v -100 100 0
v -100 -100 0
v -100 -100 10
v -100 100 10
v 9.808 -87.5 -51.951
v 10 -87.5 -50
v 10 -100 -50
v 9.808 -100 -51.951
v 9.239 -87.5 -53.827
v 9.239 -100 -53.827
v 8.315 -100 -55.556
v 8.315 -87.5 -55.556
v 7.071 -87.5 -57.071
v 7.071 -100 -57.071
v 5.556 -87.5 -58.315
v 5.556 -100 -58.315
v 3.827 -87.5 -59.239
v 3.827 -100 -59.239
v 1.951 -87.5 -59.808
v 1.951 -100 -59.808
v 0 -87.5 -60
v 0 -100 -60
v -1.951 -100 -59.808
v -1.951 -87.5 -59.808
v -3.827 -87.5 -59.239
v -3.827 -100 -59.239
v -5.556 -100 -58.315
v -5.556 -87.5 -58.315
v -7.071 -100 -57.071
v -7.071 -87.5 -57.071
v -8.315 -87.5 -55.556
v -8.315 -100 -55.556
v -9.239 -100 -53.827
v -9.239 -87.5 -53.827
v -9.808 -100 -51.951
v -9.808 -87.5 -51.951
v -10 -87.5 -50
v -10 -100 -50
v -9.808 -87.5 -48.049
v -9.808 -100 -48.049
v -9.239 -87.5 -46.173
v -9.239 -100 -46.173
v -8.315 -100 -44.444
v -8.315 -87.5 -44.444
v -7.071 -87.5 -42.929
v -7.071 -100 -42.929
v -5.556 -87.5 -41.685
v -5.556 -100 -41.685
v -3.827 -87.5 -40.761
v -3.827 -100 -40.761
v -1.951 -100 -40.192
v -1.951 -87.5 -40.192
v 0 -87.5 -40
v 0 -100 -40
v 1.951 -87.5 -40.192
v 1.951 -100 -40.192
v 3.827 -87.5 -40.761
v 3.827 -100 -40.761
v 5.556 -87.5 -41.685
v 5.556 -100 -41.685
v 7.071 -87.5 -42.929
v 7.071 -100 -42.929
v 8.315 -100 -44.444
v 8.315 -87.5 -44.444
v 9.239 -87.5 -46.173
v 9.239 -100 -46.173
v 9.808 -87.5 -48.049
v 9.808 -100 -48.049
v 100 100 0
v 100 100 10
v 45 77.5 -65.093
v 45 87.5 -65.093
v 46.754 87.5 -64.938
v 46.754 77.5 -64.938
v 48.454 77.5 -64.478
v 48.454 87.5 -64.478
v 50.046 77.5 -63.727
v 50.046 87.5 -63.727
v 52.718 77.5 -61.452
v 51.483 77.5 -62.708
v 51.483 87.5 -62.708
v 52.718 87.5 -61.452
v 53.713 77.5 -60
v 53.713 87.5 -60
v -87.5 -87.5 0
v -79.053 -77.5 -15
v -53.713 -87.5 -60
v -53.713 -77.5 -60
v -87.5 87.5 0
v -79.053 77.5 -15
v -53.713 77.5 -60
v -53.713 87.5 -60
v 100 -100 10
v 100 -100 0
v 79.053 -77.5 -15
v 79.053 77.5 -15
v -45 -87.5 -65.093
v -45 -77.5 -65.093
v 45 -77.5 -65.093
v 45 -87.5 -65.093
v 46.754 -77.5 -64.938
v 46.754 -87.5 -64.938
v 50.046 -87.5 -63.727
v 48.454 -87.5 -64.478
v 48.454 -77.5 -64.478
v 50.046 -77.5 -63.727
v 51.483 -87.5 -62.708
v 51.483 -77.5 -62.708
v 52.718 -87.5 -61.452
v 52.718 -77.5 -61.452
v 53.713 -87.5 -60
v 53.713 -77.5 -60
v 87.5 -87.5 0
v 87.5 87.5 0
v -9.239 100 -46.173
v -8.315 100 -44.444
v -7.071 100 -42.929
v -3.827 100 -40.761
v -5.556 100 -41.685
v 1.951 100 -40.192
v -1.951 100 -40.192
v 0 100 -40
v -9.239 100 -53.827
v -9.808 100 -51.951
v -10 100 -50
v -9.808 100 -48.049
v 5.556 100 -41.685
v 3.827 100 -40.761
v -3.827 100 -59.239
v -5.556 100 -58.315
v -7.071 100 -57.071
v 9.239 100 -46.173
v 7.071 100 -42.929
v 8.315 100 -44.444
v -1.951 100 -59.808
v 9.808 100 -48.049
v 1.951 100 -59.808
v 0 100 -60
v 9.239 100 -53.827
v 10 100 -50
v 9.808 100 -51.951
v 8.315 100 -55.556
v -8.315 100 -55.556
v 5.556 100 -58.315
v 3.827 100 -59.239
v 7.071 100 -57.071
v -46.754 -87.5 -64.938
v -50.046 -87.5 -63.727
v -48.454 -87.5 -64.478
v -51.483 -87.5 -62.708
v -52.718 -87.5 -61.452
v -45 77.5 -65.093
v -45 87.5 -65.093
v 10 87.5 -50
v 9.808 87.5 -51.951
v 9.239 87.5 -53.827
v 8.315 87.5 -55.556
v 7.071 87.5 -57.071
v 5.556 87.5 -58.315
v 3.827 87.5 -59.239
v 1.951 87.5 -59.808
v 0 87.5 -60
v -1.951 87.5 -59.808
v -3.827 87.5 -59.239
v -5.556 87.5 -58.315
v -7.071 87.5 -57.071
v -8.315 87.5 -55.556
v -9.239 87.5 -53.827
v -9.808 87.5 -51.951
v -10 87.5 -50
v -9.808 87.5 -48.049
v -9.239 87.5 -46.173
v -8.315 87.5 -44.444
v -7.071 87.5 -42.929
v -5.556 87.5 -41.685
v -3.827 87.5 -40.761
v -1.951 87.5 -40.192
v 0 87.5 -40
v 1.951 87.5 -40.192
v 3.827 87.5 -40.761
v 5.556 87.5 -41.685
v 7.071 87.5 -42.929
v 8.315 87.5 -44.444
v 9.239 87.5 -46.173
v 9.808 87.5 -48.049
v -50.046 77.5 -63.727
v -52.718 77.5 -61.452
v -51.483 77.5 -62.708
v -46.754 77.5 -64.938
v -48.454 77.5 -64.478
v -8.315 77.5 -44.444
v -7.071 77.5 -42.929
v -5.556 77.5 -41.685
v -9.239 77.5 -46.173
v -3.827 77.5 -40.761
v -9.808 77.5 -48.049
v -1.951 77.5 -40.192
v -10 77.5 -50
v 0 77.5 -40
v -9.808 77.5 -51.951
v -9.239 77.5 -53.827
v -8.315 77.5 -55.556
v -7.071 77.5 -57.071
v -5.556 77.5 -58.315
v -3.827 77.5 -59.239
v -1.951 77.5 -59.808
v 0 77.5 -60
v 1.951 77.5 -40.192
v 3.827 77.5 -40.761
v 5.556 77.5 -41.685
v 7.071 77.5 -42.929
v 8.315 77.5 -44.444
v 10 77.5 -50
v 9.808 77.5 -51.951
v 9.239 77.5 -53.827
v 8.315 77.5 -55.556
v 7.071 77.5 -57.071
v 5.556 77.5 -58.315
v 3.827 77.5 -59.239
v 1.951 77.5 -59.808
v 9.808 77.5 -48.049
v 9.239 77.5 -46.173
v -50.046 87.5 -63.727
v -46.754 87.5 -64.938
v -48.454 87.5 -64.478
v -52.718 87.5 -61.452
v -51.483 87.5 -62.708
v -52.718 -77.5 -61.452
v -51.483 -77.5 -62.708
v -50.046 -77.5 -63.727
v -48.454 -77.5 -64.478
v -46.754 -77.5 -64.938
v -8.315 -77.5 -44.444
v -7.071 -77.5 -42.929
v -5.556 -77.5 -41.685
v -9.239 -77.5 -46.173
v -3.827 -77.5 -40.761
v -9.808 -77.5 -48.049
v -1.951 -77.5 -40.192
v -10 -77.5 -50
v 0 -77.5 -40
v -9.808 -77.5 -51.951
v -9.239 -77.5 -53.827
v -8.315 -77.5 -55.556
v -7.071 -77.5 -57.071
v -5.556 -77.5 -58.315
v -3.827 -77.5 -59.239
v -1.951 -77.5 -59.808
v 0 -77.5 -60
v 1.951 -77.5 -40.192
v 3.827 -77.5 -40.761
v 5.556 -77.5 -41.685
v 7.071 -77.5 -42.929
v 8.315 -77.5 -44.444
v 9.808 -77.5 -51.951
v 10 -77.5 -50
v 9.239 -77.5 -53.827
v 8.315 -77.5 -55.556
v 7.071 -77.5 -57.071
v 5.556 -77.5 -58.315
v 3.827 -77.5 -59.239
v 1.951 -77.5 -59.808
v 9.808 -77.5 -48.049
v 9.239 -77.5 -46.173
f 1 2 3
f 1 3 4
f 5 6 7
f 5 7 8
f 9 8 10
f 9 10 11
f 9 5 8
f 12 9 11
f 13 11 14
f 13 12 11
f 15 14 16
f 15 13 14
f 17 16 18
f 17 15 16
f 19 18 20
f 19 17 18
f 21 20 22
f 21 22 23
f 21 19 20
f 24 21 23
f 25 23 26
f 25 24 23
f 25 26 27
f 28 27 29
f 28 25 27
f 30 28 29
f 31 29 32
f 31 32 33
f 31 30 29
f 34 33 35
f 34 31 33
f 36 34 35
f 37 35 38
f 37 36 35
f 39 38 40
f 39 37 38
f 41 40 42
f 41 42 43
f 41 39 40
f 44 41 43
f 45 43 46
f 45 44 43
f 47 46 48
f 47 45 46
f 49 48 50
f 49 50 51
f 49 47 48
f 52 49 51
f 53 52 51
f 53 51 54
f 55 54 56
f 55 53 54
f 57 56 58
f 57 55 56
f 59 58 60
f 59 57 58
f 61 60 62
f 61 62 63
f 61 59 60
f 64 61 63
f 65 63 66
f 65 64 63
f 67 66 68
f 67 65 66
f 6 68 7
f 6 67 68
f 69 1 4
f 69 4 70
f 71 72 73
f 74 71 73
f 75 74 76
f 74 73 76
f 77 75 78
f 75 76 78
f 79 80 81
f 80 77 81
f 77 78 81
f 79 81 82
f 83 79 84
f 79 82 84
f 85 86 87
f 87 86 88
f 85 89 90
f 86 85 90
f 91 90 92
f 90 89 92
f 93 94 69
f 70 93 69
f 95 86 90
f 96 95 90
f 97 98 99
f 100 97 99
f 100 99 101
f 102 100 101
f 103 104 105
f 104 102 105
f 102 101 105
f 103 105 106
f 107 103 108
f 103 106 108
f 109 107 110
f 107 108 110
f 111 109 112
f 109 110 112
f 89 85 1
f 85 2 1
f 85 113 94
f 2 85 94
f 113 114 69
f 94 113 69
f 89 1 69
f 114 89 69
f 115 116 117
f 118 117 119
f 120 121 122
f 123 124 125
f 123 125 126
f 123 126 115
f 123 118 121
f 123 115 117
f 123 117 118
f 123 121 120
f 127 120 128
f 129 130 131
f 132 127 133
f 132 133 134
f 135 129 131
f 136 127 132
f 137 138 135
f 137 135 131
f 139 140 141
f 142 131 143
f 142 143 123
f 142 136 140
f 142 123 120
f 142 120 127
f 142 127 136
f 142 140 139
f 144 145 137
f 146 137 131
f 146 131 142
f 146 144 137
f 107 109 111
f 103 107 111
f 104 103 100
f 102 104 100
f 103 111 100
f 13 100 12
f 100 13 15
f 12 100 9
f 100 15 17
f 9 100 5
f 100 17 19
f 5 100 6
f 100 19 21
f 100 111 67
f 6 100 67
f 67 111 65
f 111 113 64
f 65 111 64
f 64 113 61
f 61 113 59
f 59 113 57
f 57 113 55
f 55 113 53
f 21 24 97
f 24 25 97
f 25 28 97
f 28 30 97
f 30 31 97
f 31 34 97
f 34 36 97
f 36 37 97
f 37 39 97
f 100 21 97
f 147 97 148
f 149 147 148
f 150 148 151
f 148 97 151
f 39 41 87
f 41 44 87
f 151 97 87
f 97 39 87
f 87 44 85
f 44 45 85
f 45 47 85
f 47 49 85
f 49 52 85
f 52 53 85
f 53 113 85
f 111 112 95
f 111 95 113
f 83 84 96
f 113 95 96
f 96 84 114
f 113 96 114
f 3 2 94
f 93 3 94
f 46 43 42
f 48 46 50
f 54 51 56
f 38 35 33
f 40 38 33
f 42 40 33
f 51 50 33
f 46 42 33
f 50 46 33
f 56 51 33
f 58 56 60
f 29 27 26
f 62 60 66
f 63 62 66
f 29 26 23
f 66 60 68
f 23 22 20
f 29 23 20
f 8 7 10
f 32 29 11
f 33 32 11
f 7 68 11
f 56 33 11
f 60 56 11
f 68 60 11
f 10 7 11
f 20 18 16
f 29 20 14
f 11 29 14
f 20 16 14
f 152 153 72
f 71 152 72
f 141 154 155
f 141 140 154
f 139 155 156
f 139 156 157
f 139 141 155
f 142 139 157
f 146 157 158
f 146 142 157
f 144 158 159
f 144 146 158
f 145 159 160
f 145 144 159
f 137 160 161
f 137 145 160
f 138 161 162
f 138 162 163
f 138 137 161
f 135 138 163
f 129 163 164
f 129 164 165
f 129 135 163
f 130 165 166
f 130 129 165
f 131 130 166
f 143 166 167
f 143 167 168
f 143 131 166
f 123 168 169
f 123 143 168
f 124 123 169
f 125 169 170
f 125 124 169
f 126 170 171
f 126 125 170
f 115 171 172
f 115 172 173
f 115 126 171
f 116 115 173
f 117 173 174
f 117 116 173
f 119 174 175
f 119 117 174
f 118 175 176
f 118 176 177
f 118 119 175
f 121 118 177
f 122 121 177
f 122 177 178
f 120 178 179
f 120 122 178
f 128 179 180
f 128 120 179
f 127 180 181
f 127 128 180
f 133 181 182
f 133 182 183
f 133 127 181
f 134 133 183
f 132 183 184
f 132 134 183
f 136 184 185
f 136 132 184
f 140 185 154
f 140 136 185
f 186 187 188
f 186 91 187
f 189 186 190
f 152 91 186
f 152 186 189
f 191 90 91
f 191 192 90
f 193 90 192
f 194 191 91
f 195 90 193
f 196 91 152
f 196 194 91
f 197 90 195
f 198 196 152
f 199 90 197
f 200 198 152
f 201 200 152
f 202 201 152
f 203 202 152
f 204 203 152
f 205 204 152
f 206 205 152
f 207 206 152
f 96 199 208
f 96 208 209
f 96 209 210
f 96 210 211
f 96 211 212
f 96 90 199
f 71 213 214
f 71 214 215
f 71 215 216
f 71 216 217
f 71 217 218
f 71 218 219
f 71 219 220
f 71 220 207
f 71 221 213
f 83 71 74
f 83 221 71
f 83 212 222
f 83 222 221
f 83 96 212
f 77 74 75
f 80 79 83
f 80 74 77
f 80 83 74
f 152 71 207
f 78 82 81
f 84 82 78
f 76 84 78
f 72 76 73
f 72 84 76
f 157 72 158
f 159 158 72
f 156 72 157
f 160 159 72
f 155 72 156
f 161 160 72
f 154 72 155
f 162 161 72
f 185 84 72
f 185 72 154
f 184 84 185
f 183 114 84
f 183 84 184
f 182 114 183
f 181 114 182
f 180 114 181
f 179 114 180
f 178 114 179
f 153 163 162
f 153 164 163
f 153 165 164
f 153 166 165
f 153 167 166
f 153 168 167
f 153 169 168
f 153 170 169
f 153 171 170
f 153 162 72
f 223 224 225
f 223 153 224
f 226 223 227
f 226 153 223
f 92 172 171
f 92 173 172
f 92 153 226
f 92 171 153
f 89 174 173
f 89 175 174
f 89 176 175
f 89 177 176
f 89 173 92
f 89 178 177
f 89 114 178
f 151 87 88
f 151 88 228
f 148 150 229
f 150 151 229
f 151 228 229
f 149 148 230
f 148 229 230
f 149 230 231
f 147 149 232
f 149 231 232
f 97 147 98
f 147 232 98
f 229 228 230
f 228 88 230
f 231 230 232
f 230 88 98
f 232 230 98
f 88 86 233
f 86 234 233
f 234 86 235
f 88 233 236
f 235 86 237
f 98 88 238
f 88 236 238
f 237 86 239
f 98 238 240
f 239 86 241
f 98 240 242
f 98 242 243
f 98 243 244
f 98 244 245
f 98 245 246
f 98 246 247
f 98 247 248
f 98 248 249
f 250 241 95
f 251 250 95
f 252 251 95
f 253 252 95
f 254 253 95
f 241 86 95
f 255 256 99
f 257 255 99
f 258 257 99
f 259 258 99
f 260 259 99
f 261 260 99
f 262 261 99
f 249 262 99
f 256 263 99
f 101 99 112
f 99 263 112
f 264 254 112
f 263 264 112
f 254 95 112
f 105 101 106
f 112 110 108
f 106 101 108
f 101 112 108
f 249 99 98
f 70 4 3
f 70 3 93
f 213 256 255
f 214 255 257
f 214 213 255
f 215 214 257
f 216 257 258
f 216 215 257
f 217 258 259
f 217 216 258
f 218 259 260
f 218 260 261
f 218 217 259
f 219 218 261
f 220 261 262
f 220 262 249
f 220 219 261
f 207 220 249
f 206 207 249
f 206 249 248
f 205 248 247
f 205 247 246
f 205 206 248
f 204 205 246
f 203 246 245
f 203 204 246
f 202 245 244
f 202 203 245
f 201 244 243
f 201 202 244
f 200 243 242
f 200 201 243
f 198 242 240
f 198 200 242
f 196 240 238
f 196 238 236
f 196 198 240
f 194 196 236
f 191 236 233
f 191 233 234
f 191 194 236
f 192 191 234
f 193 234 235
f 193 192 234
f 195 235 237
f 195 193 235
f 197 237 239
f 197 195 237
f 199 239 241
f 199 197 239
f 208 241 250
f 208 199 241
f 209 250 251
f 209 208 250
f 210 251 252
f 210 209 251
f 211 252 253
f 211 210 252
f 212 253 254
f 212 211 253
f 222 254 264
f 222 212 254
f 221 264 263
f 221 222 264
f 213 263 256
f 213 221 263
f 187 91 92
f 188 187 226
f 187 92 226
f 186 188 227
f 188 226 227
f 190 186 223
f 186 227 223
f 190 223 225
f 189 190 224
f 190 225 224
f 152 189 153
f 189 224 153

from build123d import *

# Parameters (mm, degrees)
SKETCH1_W           = 200
SKETCH1_H           = 200
BOSS_EXTRUDE1_DEPTH = 10
SKETCH2_W           = 175
SKETCH2_H           = 175
BOSS_EXTRUDE2_DEPTH = 75
CUT_EXTRUDE2_DEPTH  = 188.5
SKETCH6_W           = 50.093360238
SKETCH6_H           = 155
CUT_EXTRUDE3_DEPTH  = 100
SKETCH7_R           = 10
BOSS_EXTRUDE4_DEPTH = 100


with BuildPart() as part:
    # Sketch1 → Boss-Extrude1 (new body)
    with BuildSketch(Plane.XY):
        Rectangle(SKETCH1_W, SKETCH1_H)
    extrude(amount=BOSS_EXTRUDE1_DEPTH)

    # Sketch2 → Boss-Extrude2 (add)
    with BuildSketch(Plane(origin=(0, 0, 0), x_dir=(-1, 0, 0), z_dir=(0, 0, -1))):
        Rectangle(SKETCH2_W, SKETCH2_H)
    extrude(amount=BOSS_EXTRUDE2_DEPTH)

    # Sketch5 → Cut-Extrude2 (cut, through all)
    with BuildSketch(Plane(origin=(0, 87.5, 0), x_dir=(1, 0, 0), z_dir=(0, 1, 0))):
        with BuildLine():
            Line((-87.5, 0), (-53.713488753, 60))
            ThreePointArc((-53.713488753, 60), (-50.046464226, 63.72662143), (-45, 65.093360238))
            Line((-45, 65.093360238), (45, 65.093360238))
            ThreePointArc((45, 65.093360238), (50.046464226, 63.72662143), (53.713488753, 60))
            Line((53.713488753, 60), (87.5, 0))
            Line((87.5, 0), (87.5, 75))
            Line((87.5, 75), (-87.5, 75))
            Line((-87.5, 75), (-87.5, 0))
        make_face()
    extrude(amount=-CUT_EXTRUDE2_DEPTH, mode=Mode.SUBTRACT)

    # Sketch6 → Cut-Extrude3 (cut, symmetric)
    with BuildSketch(Plane(origin=(0, 0, 0), x_dir=(0, 0, -1), z_dir=(1, 0, 0))):
        with Locations((40.046680119, 0)):
            Rectangle(SKETCH6_W, SKETCH6_H)
    extrude(amount=CUT_EXTRUDE3_DEPTH, both=True, mode=Mode.SUBTRACT)

    # Sketch7 → Boss-Extrude4 (add, symmetric)
    with BuildSketch(Plane(origin=(0, 0, 0), x_dir=(1, 0, 0), z_dir=(0, 1, 0))):
        with Locations((0, 50)):
            Circle(SKETCH7_R)
    extrude(amount=BOSS_EXTRUDE4_DEPTH, both=True)


solid = part.part
